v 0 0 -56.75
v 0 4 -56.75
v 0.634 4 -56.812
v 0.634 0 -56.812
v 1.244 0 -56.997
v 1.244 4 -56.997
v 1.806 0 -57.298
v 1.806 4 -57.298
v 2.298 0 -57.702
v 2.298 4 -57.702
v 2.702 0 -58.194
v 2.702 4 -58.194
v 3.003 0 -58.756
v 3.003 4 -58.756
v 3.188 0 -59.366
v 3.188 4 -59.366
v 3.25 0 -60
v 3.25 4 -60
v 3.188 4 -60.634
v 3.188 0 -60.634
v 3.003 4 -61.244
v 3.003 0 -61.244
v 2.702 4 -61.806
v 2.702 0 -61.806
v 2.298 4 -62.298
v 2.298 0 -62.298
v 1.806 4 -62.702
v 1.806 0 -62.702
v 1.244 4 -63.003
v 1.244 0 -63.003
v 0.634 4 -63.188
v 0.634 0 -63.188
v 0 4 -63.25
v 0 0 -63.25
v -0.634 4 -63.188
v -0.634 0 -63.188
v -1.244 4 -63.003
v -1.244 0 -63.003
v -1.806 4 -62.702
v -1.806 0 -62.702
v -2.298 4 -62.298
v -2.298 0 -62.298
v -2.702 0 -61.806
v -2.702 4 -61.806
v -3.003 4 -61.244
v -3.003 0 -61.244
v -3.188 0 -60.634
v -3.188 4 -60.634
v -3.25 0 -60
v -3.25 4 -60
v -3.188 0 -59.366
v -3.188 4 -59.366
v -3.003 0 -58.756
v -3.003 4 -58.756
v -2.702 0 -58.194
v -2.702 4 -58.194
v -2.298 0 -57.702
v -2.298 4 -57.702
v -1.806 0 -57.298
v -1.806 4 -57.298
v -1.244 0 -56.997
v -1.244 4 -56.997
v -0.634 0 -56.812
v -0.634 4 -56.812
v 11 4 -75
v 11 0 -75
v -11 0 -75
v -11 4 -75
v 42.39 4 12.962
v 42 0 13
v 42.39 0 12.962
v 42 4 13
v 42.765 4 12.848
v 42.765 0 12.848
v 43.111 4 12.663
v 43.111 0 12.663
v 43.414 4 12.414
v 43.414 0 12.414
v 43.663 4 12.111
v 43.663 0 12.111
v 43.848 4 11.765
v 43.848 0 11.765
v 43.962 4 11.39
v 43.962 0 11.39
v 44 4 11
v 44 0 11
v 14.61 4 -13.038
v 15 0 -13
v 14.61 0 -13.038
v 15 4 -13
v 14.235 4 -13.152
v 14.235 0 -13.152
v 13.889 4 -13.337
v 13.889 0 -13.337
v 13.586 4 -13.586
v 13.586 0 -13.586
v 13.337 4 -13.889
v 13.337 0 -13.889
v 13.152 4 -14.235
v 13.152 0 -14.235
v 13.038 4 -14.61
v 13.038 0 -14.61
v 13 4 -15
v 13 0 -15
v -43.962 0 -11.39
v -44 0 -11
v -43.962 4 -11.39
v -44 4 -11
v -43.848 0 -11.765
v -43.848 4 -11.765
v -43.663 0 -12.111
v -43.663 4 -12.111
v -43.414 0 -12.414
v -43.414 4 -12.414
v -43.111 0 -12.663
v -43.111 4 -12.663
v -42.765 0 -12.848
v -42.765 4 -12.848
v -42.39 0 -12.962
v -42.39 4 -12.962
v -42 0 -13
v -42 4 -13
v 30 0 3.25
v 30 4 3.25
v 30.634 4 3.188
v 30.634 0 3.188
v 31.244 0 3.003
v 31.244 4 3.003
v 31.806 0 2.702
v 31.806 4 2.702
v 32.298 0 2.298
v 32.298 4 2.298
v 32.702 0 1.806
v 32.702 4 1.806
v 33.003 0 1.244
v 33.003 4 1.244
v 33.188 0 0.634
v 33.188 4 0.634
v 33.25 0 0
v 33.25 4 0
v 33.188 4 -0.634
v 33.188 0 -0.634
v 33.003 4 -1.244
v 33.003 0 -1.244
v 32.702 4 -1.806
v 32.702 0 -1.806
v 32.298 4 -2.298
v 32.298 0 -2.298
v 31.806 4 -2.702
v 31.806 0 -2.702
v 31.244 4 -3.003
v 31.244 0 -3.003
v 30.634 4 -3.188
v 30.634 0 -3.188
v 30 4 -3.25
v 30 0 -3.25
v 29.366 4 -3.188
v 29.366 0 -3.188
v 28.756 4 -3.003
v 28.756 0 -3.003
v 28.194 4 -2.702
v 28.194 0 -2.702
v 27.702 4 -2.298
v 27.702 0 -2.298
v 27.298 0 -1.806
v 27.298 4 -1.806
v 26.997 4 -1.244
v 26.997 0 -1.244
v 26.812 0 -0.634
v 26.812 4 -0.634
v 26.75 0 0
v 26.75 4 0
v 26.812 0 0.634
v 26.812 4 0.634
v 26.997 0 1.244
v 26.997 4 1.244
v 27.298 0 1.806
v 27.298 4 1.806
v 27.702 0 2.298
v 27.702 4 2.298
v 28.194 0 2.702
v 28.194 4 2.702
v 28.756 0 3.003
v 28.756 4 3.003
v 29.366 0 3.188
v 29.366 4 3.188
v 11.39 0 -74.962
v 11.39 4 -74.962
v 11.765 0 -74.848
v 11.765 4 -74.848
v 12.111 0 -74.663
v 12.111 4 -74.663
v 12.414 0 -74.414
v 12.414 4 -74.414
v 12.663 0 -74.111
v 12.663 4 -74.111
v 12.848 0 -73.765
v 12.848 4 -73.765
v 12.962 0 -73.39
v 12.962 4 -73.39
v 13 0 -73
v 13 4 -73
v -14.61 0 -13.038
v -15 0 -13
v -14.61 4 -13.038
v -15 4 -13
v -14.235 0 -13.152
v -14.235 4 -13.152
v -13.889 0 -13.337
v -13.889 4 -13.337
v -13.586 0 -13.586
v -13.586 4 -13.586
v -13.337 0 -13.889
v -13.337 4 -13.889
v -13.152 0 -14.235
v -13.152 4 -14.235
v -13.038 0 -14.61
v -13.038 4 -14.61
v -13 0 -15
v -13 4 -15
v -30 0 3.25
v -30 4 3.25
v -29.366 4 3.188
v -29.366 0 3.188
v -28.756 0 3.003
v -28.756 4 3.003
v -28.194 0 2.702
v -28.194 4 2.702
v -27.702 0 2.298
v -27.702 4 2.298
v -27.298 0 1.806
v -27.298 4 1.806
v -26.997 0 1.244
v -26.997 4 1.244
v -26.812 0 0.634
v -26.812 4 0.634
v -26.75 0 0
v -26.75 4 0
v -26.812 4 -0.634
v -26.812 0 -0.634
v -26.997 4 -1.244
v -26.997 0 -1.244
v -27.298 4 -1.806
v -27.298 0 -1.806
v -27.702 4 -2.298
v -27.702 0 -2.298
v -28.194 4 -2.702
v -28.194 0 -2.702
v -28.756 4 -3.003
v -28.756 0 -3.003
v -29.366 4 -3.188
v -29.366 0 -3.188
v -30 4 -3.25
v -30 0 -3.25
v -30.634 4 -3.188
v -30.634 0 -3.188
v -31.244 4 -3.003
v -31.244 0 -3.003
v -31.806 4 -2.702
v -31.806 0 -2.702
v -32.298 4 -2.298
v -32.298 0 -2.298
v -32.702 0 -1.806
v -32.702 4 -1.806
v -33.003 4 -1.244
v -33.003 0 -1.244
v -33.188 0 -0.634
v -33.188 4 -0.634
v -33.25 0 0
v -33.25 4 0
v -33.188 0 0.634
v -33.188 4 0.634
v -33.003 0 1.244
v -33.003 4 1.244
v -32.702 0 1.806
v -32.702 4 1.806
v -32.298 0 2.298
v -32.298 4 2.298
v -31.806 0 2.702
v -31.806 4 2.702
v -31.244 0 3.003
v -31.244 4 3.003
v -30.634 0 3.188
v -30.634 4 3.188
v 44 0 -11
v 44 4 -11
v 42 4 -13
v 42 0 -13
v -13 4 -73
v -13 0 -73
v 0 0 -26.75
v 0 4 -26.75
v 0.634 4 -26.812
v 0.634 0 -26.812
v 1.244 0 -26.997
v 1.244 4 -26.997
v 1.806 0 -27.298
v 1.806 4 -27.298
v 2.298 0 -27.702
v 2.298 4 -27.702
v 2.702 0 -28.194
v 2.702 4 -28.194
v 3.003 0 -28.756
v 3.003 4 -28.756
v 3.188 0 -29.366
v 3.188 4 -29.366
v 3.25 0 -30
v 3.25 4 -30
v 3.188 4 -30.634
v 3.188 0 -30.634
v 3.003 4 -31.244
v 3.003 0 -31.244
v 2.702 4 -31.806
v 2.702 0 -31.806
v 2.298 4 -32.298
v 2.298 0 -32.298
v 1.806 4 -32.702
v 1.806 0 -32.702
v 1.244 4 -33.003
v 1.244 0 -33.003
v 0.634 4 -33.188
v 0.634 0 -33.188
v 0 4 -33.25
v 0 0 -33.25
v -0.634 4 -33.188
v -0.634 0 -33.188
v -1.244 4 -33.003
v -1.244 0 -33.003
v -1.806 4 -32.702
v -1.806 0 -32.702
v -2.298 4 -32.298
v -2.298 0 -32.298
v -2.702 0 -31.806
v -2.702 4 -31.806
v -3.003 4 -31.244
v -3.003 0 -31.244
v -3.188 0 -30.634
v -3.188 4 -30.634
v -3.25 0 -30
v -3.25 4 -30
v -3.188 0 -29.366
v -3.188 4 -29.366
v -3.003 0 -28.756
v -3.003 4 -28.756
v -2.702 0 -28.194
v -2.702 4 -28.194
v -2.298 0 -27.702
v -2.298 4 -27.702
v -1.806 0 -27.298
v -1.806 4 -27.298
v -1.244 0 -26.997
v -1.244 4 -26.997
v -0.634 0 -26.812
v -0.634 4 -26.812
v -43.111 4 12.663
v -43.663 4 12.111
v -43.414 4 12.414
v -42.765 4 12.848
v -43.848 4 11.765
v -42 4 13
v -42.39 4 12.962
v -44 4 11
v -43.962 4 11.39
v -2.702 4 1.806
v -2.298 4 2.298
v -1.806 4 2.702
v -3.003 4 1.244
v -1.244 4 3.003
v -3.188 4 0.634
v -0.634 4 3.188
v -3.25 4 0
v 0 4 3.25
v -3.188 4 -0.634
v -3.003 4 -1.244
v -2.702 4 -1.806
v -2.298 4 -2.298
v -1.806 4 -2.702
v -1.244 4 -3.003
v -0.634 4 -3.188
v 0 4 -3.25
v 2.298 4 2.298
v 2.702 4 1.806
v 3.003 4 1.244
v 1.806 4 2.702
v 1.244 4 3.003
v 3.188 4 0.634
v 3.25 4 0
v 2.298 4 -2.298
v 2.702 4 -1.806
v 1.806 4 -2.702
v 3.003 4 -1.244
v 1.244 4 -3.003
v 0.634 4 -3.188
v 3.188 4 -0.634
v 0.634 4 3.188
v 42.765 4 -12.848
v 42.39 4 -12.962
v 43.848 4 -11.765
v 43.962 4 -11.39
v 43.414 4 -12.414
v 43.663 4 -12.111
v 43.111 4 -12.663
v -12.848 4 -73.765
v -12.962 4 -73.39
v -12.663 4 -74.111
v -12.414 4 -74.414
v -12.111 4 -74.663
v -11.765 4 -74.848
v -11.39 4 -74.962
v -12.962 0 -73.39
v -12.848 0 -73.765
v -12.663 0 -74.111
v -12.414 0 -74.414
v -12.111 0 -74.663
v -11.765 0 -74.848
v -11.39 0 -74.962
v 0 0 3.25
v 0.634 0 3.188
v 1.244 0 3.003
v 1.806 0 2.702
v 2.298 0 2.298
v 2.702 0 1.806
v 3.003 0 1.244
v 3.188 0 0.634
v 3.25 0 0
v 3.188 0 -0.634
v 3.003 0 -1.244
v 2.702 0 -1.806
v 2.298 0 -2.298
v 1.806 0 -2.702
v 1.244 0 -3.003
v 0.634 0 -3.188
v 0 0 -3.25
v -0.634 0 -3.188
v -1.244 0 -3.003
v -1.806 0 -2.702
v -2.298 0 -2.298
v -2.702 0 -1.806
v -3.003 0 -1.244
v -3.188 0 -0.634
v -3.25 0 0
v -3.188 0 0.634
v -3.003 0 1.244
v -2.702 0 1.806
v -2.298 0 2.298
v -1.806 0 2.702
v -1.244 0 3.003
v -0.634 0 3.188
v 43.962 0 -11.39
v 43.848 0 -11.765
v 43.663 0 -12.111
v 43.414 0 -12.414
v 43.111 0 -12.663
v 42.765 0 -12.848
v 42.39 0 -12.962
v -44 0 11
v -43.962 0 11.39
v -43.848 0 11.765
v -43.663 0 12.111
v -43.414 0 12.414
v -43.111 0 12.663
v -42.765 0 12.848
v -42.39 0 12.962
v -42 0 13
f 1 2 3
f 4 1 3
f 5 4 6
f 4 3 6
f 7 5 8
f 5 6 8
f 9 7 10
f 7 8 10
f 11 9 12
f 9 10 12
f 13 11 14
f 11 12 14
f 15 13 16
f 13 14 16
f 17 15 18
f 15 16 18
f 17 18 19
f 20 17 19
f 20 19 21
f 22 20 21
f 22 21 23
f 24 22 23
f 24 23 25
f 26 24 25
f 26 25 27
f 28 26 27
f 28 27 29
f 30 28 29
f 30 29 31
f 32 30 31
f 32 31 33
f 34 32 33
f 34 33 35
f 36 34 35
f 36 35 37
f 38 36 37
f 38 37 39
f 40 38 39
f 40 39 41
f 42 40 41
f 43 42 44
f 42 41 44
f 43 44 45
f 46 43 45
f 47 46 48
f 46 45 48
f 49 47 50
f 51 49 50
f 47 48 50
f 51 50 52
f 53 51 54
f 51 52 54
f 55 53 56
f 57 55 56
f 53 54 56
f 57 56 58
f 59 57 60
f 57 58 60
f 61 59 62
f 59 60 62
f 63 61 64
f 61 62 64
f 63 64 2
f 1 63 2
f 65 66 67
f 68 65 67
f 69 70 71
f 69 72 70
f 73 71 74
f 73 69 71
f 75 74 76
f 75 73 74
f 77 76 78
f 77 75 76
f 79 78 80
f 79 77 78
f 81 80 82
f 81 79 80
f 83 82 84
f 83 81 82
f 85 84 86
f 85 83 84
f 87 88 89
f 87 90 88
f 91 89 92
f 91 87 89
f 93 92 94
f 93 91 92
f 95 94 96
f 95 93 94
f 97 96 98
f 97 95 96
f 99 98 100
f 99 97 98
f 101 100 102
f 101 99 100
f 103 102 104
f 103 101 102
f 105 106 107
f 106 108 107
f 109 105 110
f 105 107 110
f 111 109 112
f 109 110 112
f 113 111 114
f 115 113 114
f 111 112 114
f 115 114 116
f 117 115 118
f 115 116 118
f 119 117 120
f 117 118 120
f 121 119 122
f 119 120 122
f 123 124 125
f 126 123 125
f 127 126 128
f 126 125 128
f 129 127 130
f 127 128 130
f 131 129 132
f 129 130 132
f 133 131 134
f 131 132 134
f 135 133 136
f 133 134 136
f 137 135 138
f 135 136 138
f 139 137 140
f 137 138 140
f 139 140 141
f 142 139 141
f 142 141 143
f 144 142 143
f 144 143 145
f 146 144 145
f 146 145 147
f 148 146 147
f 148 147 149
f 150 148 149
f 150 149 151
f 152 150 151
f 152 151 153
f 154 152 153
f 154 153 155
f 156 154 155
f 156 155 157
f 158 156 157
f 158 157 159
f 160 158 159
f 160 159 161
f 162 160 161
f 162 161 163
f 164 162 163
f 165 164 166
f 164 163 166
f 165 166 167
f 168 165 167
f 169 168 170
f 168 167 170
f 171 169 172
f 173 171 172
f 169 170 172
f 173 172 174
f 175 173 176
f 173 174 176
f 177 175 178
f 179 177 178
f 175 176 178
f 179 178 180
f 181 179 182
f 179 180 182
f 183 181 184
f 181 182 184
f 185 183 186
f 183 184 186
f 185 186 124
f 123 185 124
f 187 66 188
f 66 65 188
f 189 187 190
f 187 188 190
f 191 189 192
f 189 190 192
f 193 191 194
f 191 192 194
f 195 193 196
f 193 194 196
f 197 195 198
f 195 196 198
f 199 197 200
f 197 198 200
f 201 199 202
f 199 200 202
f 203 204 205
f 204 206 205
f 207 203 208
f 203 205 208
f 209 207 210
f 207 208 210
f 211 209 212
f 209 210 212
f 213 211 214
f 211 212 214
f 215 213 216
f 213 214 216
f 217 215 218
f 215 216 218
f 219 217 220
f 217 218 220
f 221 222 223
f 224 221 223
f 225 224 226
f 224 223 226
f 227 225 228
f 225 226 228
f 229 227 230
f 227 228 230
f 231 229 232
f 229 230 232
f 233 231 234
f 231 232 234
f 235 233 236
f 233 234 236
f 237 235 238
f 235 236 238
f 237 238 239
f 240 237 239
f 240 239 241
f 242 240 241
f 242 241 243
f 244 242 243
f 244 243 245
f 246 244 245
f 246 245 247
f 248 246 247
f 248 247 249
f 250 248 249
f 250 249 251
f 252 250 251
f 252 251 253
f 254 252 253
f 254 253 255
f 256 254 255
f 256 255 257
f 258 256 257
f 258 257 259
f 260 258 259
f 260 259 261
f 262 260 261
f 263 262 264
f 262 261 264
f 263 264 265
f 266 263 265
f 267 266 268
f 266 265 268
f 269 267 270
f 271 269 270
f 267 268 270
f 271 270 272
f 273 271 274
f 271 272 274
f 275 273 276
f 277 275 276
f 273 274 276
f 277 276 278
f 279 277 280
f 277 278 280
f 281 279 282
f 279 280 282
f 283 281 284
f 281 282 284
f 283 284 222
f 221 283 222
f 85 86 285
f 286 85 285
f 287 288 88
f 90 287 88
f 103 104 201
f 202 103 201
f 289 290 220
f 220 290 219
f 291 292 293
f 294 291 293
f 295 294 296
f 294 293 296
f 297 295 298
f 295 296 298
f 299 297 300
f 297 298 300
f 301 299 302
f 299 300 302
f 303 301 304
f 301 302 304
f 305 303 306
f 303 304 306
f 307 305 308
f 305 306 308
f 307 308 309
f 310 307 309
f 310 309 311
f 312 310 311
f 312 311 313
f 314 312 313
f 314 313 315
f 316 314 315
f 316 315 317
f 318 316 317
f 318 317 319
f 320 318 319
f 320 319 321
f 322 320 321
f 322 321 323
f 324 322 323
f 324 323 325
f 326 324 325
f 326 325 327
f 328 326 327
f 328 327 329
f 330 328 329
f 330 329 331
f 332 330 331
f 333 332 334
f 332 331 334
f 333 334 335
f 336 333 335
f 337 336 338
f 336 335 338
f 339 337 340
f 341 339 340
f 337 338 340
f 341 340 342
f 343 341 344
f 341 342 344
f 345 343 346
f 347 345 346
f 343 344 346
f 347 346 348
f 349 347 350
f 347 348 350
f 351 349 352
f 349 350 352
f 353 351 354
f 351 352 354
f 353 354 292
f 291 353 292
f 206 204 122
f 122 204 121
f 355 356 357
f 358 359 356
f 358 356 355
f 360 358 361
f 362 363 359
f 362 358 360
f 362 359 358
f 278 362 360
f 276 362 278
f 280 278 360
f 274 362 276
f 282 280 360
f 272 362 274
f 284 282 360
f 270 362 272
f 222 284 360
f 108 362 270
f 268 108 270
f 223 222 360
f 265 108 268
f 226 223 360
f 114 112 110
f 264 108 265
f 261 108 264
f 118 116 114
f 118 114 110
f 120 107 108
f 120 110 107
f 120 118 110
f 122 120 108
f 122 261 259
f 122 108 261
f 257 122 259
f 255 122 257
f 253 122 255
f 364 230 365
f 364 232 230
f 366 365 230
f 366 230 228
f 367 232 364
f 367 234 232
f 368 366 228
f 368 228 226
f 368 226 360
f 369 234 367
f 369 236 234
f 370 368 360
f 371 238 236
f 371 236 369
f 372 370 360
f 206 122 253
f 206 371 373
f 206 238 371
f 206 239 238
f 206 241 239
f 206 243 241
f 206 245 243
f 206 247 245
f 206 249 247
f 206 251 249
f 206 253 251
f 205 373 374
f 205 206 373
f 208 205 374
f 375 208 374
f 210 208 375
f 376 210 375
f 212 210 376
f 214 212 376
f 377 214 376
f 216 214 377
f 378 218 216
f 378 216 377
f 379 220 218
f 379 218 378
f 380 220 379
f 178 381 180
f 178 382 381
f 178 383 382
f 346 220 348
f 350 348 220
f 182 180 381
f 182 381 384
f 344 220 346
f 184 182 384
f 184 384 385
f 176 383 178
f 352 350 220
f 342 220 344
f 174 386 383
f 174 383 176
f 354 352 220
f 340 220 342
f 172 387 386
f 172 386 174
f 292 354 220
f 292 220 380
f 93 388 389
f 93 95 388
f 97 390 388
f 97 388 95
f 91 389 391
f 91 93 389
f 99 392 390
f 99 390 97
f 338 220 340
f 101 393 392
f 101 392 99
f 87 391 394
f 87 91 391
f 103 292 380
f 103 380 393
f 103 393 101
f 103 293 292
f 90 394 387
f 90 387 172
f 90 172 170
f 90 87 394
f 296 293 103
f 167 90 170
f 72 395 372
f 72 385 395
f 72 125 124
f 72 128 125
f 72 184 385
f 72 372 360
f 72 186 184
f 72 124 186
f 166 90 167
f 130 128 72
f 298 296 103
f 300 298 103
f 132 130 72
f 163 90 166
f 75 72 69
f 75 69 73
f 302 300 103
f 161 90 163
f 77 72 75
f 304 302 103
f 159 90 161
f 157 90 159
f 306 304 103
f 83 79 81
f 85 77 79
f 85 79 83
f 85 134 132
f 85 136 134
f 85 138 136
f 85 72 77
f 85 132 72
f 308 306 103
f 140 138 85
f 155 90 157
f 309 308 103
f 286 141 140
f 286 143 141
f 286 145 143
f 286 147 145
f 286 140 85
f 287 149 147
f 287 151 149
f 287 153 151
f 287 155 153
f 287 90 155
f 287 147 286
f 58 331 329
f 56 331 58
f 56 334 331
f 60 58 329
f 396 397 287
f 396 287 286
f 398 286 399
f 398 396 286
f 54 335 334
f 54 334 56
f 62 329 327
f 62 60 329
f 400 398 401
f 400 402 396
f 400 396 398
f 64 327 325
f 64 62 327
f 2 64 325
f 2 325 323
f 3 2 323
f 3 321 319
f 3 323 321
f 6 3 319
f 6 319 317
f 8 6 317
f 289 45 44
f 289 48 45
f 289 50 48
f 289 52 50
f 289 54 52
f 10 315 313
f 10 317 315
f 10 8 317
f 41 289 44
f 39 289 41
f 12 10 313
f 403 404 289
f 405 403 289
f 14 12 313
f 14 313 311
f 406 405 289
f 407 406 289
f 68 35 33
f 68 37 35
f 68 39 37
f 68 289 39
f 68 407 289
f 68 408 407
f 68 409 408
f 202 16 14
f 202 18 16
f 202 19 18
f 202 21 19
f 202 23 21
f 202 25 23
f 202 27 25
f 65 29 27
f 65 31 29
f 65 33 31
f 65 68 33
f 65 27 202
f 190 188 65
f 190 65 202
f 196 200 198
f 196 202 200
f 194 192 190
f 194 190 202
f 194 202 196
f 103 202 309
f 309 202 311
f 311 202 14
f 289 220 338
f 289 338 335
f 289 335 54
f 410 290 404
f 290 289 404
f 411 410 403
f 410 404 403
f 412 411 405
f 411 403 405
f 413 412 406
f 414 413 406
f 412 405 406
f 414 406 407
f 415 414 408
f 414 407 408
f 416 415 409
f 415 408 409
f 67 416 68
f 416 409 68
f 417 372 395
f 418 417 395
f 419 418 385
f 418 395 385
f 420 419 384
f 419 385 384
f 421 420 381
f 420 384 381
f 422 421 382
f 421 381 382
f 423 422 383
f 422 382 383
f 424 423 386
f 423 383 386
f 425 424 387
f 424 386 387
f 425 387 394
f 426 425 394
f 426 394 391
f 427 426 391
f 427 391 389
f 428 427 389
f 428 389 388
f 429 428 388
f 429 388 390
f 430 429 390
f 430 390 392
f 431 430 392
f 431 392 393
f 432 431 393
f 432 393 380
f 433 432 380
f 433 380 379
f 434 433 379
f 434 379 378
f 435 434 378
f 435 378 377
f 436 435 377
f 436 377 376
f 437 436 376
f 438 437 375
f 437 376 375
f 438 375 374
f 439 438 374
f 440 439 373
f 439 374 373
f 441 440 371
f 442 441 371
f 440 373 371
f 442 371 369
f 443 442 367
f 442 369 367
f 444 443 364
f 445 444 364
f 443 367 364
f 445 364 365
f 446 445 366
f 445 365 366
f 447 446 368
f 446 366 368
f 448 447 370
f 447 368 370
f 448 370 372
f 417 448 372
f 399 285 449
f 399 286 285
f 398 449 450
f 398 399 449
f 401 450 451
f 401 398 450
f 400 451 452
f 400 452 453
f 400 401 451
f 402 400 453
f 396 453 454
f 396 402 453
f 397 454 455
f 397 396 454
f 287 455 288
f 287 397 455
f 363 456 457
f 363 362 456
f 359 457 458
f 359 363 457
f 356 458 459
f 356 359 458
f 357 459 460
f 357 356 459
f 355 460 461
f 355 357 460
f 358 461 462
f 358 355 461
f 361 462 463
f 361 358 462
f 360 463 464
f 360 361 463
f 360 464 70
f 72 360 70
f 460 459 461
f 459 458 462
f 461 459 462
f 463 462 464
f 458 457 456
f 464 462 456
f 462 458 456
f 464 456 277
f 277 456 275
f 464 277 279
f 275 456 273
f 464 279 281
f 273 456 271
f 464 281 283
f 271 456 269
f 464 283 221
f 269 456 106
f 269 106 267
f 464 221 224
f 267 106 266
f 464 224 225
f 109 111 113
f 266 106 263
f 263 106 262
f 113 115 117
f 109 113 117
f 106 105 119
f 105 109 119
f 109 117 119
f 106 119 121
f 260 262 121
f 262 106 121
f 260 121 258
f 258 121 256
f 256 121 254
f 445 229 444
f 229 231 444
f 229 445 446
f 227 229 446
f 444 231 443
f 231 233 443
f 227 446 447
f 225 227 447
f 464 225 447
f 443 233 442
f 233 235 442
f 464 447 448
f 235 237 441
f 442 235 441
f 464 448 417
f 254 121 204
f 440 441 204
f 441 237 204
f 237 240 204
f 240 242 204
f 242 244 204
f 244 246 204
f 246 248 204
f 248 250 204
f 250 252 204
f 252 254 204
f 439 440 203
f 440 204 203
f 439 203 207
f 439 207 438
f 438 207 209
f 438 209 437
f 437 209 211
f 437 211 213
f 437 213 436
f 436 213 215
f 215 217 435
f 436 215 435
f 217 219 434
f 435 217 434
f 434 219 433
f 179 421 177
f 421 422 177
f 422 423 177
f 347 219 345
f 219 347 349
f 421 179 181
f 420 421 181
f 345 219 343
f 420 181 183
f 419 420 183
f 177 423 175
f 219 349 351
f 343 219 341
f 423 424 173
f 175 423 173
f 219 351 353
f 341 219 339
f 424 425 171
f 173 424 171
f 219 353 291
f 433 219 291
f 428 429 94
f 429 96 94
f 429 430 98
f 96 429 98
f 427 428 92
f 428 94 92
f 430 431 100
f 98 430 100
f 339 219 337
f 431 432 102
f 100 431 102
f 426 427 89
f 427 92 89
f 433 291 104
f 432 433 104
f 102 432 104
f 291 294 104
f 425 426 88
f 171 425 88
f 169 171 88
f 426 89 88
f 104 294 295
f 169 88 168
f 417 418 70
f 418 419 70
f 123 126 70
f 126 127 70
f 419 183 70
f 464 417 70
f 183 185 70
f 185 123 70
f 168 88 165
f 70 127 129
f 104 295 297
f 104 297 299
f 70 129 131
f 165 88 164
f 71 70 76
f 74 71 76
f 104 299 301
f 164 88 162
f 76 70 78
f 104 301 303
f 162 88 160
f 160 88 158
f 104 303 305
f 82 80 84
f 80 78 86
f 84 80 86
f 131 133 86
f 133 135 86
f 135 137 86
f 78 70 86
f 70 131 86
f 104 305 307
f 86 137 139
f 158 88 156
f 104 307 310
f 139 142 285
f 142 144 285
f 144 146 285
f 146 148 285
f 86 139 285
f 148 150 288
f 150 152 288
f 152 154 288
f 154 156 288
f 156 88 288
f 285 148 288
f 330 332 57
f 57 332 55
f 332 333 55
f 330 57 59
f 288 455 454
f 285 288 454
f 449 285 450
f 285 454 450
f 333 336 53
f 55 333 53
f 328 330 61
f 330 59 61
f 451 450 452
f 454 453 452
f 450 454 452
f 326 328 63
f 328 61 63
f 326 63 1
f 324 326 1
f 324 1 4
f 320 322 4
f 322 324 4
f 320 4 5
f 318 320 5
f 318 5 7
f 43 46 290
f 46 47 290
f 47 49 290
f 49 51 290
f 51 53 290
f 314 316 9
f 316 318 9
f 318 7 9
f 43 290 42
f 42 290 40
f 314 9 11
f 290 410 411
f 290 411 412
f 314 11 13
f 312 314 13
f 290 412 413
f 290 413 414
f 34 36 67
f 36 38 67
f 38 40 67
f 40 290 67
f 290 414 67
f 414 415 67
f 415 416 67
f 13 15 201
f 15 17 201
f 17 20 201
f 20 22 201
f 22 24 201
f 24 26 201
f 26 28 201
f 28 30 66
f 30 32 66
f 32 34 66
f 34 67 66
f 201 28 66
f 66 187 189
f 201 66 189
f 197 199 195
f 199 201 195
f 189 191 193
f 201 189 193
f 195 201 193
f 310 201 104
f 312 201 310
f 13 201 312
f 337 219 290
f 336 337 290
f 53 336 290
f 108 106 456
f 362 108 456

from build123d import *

# Parameters (mm, degrees)
BOSS_EXTRUDE1_DEPTH = 4
SKETCH3_R           = 3.25
CUT_EXTRUDE1_DEPTH  = 88.045964869
FILLET1_R           = 2


with BuildPart() as part:
    # Sketch1 → Boss-Extrude1 (new body)
    with BuildSketch(Plane(origin=(0, 0, 0), x_dir=(1, 0, 0), z_dir=(0, 1, 0))):
        Polygon((-44, 13), (-44, -13), (44, -13), (44, 13), (13, 13), (13, 75), (-13, 75), (-13, 13), align=None)
    extrude(amount=BOSS_EXTRUDE1_DEPTH)

    # Sketch3 → Cut-Extrude1 (cut, through all)
    with BuildSketch(Plane(origin=(0, 4, 0), x_dir=(1, 0, 0), z_dir=(0, 1, 0))):
        with Locations(Location((0, 0, 0), (0, 0, 270))):
            Circle(SKETCH3_R)
        with Locations(Location((30, 0, 0), (0, 0, 270))):
            Circle(SKETCH3_R)
        with Locations(Location((-30, 0, 0), (0, 0, 270))):
            Circle(SKETCH3_R)
        with Locations(Location((0, 60, 0), (0, 0, 270))):
            Circle(SKETCH3_R)
        with Locations(Location((0, 30, 0), (0, 0, 270))):
            Circle(SKETCH3_R)
    extrude(amount=-CUT_EXTRUDE1_DEPTH, mode=Mode.SUBTRACT)

    # Fillet1
    fillet1_edges = [part.edges().sort_by_distance(p)[0] for p in [
        (44, 2, 13),
        (-44, 2, 13),
        (-44, 2, -13),
        (-13, 2, -13),
        (-13, 2, -75),
        (13, 2, -75),
        (13, 2, -13),
        (44, 2, -13),
    ]]
    fillet(fillet1_edges, radius=FILLET1_R)


solid = part.part
